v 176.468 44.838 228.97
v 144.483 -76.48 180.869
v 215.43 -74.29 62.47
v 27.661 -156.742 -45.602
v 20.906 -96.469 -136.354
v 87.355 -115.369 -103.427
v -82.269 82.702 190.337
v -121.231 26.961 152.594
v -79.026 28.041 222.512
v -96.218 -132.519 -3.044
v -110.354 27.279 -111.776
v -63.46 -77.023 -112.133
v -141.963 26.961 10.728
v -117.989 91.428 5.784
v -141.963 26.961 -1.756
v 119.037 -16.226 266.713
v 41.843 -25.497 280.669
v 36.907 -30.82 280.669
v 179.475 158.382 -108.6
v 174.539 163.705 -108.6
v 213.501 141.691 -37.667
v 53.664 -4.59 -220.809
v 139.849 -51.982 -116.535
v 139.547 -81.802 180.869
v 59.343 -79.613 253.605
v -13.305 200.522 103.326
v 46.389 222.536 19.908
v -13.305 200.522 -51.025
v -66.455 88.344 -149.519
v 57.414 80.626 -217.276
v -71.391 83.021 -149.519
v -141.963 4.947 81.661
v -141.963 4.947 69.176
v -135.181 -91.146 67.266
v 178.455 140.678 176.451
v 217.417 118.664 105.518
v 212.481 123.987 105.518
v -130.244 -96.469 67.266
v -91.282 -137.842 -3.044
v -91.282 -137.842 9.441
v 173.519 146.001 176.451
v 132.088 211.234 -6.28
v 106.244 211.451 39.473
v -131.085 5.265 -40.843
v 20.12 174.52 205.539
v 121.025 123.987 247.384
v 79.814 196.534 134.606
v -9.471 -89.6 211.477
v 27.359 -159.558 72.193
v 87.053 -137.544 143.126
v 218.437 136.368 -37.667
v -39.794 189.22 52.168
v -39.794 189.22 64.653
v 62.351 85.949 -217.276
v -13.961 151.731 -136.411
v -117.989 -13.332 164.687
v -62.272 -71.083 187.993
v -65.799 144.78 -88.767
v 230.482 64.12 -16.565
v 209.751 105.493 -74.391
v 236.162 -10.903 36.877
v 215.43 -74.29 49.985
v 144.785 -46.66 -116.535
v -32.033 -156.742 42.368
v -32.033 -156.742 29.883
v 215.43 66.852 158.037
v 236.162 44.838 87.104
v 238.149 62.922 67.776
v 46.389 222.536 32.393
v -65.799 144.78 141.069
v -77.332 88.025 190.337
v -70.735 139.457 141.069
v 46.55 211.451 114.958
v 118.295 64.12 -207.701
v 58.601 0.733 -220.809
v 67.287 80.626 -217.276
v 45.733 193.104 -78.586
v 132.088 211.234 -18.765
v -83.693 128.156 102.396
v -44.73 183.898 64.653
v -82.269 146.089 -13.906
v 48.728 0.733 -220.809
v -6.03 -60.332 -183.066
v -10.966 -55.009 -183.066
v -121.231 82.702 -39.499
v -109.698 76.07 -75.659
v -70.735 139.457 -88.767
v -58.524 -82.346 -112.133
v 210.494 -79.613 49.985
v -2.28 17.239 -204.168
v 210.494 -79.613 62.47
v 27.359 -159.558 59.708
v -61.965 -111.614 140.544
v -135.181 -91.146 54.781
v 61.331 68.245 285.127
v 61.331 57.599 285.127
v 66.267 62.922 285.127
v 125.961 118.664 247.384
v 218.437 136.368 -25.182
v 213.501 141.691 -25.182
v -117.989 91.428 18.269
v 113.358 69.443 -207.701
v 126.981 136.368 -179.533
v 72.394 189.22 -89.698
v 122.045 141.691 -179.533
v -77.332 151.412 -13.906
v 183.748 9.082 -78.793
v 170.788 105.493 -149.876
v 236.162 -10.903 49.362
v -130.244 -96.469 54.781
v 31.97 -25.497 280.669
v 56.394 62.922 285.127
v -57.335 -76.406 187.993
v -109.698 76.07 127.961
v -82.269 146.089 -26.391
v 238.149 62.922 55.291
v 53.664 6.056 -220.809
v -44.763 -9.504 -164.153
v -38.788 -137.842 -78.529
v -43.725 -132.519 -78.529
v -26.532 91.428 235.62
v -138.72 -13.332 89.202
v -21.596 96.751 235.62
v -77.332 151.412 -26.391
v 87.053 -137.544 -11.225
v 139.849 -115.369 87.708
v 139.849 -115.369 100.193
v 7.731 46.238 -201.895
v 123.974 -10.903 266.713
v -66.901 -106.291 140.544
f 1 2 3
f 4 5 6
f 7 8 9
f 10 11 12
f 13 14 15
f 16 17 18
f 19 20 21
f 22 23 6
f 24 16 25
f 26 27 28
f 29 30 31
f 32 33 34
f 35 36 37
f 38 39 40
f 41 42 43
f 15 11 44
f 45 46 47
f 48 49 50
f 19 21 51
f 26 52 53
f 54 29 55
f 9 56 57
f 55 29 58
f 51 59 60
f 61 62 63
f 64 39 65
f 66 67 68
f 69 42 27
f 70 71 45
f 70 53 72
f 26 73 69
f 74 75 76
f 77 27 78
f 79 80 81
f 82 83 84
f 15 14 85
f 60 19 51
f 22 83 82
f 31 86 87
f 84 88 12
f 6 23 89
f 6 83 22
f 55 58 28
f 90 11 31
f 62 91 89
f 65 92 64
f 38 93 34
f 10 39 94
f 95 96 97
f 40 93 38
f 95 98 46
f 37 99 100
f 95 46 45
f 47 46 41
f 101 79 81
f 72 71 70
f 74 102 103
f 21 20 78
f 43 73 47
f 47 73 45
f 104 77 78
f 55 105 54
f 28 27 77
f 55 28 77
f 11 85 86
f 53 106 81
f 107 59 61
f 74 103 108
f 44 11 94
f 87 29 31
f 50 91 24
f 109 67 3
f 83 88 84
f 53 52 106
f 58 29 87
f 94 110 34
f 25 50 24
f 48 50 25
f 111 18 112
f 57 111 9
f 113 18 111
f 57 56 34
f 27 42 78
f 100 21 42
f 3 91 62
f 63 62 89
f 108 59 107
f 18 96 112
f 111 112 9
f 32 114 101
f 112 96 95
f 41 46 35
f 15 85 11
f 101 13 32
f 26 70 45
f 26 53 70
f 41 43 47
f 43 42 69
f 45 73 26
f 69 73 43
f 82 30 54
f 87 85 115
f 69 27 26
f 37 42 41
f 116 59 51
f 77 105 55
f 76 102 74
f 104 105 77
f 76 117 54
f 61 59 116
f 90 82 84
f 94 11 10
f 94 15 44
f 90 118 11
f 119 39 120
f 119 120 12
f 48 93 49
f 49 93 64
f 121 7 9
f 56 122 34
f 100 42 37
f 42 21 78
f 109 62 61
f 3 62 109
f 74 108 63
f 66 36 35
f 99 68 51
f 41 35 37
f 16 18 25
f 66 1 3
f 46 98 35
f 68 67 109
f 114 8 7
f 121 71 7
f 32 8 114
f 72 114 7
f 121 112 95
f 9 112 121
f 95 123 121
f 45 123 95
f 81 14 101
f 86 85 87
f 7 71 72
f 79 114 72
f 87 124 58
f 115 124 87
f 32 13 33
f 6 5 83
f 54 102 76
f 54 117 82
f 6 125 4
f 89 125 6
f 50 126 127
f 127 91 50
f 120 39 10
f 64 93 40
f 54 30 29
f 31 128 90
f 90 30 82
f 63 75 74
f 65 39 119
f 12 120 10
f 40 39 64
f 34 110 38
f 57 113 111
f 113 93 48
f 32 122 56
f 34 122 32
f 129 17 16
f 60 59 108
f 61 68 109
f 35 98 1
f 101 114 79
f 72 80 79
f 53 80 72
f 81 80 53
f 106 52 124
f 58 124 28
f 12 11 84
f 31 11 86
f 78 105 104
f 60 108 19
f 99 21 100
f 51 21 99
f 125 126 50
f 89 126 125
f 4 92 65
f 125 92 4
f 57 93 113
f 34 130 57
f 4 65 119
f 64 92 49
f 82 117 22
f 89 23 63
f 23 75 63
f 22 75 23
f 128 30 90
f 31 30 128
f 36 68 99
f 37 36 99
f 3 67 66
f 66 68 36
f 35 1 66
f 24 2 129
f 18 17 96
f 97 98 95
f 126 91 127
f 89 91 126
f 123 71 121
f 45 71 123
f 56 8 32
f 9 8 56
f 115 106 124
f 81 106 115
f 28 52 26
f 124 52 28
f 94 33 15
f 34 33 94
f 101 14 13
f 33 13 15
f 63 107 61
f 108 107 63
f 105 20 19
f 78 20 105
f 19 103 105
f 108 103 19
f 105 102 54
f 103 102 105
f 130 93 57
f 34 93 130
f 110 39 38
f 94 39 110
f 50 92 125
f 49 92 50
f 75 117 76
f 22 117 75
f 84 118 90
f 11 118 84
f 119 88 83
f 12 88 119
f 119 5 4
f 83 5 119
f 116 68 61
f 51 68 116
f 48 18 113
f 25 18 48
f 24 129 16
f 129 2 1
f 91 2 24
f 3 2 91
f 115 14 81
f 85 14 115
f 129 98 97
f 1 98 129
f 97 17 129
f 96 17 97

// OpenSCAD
size = 150;
deformation_scale = 50;
deform_seed = 42;

skew_scale = .5;
skew_seed = 51;

resolution = 20;
finest_point = 6;

// Hidden
$fn = 4;

hull(){
  translate([.1*size, 0, 0]) {
    random_skew=rands(0, skew_scale, 4, skew_seed);
    echo ("random_skew", random_skew);
    scale([ 1 + random_skew[0], 1 + random_skew[1], 1 + random_skew[2]]) {
      for (ii=[0:resolution:360]) {
        for (i=[0:resolution:170]) {
          translate([size * sin(ii),  size * cos(ii) * cos(i), size * cos(ii) * sin(i)]) {
            random_offset=rands(0, deformation_scale, 4, deform_seed + i + ii);

            translate([ random_offset[0], random_offset[1], random_offset[2]]) {
              sphere(finest_point);
            }
          }
        }
      }
    }
  }
}
